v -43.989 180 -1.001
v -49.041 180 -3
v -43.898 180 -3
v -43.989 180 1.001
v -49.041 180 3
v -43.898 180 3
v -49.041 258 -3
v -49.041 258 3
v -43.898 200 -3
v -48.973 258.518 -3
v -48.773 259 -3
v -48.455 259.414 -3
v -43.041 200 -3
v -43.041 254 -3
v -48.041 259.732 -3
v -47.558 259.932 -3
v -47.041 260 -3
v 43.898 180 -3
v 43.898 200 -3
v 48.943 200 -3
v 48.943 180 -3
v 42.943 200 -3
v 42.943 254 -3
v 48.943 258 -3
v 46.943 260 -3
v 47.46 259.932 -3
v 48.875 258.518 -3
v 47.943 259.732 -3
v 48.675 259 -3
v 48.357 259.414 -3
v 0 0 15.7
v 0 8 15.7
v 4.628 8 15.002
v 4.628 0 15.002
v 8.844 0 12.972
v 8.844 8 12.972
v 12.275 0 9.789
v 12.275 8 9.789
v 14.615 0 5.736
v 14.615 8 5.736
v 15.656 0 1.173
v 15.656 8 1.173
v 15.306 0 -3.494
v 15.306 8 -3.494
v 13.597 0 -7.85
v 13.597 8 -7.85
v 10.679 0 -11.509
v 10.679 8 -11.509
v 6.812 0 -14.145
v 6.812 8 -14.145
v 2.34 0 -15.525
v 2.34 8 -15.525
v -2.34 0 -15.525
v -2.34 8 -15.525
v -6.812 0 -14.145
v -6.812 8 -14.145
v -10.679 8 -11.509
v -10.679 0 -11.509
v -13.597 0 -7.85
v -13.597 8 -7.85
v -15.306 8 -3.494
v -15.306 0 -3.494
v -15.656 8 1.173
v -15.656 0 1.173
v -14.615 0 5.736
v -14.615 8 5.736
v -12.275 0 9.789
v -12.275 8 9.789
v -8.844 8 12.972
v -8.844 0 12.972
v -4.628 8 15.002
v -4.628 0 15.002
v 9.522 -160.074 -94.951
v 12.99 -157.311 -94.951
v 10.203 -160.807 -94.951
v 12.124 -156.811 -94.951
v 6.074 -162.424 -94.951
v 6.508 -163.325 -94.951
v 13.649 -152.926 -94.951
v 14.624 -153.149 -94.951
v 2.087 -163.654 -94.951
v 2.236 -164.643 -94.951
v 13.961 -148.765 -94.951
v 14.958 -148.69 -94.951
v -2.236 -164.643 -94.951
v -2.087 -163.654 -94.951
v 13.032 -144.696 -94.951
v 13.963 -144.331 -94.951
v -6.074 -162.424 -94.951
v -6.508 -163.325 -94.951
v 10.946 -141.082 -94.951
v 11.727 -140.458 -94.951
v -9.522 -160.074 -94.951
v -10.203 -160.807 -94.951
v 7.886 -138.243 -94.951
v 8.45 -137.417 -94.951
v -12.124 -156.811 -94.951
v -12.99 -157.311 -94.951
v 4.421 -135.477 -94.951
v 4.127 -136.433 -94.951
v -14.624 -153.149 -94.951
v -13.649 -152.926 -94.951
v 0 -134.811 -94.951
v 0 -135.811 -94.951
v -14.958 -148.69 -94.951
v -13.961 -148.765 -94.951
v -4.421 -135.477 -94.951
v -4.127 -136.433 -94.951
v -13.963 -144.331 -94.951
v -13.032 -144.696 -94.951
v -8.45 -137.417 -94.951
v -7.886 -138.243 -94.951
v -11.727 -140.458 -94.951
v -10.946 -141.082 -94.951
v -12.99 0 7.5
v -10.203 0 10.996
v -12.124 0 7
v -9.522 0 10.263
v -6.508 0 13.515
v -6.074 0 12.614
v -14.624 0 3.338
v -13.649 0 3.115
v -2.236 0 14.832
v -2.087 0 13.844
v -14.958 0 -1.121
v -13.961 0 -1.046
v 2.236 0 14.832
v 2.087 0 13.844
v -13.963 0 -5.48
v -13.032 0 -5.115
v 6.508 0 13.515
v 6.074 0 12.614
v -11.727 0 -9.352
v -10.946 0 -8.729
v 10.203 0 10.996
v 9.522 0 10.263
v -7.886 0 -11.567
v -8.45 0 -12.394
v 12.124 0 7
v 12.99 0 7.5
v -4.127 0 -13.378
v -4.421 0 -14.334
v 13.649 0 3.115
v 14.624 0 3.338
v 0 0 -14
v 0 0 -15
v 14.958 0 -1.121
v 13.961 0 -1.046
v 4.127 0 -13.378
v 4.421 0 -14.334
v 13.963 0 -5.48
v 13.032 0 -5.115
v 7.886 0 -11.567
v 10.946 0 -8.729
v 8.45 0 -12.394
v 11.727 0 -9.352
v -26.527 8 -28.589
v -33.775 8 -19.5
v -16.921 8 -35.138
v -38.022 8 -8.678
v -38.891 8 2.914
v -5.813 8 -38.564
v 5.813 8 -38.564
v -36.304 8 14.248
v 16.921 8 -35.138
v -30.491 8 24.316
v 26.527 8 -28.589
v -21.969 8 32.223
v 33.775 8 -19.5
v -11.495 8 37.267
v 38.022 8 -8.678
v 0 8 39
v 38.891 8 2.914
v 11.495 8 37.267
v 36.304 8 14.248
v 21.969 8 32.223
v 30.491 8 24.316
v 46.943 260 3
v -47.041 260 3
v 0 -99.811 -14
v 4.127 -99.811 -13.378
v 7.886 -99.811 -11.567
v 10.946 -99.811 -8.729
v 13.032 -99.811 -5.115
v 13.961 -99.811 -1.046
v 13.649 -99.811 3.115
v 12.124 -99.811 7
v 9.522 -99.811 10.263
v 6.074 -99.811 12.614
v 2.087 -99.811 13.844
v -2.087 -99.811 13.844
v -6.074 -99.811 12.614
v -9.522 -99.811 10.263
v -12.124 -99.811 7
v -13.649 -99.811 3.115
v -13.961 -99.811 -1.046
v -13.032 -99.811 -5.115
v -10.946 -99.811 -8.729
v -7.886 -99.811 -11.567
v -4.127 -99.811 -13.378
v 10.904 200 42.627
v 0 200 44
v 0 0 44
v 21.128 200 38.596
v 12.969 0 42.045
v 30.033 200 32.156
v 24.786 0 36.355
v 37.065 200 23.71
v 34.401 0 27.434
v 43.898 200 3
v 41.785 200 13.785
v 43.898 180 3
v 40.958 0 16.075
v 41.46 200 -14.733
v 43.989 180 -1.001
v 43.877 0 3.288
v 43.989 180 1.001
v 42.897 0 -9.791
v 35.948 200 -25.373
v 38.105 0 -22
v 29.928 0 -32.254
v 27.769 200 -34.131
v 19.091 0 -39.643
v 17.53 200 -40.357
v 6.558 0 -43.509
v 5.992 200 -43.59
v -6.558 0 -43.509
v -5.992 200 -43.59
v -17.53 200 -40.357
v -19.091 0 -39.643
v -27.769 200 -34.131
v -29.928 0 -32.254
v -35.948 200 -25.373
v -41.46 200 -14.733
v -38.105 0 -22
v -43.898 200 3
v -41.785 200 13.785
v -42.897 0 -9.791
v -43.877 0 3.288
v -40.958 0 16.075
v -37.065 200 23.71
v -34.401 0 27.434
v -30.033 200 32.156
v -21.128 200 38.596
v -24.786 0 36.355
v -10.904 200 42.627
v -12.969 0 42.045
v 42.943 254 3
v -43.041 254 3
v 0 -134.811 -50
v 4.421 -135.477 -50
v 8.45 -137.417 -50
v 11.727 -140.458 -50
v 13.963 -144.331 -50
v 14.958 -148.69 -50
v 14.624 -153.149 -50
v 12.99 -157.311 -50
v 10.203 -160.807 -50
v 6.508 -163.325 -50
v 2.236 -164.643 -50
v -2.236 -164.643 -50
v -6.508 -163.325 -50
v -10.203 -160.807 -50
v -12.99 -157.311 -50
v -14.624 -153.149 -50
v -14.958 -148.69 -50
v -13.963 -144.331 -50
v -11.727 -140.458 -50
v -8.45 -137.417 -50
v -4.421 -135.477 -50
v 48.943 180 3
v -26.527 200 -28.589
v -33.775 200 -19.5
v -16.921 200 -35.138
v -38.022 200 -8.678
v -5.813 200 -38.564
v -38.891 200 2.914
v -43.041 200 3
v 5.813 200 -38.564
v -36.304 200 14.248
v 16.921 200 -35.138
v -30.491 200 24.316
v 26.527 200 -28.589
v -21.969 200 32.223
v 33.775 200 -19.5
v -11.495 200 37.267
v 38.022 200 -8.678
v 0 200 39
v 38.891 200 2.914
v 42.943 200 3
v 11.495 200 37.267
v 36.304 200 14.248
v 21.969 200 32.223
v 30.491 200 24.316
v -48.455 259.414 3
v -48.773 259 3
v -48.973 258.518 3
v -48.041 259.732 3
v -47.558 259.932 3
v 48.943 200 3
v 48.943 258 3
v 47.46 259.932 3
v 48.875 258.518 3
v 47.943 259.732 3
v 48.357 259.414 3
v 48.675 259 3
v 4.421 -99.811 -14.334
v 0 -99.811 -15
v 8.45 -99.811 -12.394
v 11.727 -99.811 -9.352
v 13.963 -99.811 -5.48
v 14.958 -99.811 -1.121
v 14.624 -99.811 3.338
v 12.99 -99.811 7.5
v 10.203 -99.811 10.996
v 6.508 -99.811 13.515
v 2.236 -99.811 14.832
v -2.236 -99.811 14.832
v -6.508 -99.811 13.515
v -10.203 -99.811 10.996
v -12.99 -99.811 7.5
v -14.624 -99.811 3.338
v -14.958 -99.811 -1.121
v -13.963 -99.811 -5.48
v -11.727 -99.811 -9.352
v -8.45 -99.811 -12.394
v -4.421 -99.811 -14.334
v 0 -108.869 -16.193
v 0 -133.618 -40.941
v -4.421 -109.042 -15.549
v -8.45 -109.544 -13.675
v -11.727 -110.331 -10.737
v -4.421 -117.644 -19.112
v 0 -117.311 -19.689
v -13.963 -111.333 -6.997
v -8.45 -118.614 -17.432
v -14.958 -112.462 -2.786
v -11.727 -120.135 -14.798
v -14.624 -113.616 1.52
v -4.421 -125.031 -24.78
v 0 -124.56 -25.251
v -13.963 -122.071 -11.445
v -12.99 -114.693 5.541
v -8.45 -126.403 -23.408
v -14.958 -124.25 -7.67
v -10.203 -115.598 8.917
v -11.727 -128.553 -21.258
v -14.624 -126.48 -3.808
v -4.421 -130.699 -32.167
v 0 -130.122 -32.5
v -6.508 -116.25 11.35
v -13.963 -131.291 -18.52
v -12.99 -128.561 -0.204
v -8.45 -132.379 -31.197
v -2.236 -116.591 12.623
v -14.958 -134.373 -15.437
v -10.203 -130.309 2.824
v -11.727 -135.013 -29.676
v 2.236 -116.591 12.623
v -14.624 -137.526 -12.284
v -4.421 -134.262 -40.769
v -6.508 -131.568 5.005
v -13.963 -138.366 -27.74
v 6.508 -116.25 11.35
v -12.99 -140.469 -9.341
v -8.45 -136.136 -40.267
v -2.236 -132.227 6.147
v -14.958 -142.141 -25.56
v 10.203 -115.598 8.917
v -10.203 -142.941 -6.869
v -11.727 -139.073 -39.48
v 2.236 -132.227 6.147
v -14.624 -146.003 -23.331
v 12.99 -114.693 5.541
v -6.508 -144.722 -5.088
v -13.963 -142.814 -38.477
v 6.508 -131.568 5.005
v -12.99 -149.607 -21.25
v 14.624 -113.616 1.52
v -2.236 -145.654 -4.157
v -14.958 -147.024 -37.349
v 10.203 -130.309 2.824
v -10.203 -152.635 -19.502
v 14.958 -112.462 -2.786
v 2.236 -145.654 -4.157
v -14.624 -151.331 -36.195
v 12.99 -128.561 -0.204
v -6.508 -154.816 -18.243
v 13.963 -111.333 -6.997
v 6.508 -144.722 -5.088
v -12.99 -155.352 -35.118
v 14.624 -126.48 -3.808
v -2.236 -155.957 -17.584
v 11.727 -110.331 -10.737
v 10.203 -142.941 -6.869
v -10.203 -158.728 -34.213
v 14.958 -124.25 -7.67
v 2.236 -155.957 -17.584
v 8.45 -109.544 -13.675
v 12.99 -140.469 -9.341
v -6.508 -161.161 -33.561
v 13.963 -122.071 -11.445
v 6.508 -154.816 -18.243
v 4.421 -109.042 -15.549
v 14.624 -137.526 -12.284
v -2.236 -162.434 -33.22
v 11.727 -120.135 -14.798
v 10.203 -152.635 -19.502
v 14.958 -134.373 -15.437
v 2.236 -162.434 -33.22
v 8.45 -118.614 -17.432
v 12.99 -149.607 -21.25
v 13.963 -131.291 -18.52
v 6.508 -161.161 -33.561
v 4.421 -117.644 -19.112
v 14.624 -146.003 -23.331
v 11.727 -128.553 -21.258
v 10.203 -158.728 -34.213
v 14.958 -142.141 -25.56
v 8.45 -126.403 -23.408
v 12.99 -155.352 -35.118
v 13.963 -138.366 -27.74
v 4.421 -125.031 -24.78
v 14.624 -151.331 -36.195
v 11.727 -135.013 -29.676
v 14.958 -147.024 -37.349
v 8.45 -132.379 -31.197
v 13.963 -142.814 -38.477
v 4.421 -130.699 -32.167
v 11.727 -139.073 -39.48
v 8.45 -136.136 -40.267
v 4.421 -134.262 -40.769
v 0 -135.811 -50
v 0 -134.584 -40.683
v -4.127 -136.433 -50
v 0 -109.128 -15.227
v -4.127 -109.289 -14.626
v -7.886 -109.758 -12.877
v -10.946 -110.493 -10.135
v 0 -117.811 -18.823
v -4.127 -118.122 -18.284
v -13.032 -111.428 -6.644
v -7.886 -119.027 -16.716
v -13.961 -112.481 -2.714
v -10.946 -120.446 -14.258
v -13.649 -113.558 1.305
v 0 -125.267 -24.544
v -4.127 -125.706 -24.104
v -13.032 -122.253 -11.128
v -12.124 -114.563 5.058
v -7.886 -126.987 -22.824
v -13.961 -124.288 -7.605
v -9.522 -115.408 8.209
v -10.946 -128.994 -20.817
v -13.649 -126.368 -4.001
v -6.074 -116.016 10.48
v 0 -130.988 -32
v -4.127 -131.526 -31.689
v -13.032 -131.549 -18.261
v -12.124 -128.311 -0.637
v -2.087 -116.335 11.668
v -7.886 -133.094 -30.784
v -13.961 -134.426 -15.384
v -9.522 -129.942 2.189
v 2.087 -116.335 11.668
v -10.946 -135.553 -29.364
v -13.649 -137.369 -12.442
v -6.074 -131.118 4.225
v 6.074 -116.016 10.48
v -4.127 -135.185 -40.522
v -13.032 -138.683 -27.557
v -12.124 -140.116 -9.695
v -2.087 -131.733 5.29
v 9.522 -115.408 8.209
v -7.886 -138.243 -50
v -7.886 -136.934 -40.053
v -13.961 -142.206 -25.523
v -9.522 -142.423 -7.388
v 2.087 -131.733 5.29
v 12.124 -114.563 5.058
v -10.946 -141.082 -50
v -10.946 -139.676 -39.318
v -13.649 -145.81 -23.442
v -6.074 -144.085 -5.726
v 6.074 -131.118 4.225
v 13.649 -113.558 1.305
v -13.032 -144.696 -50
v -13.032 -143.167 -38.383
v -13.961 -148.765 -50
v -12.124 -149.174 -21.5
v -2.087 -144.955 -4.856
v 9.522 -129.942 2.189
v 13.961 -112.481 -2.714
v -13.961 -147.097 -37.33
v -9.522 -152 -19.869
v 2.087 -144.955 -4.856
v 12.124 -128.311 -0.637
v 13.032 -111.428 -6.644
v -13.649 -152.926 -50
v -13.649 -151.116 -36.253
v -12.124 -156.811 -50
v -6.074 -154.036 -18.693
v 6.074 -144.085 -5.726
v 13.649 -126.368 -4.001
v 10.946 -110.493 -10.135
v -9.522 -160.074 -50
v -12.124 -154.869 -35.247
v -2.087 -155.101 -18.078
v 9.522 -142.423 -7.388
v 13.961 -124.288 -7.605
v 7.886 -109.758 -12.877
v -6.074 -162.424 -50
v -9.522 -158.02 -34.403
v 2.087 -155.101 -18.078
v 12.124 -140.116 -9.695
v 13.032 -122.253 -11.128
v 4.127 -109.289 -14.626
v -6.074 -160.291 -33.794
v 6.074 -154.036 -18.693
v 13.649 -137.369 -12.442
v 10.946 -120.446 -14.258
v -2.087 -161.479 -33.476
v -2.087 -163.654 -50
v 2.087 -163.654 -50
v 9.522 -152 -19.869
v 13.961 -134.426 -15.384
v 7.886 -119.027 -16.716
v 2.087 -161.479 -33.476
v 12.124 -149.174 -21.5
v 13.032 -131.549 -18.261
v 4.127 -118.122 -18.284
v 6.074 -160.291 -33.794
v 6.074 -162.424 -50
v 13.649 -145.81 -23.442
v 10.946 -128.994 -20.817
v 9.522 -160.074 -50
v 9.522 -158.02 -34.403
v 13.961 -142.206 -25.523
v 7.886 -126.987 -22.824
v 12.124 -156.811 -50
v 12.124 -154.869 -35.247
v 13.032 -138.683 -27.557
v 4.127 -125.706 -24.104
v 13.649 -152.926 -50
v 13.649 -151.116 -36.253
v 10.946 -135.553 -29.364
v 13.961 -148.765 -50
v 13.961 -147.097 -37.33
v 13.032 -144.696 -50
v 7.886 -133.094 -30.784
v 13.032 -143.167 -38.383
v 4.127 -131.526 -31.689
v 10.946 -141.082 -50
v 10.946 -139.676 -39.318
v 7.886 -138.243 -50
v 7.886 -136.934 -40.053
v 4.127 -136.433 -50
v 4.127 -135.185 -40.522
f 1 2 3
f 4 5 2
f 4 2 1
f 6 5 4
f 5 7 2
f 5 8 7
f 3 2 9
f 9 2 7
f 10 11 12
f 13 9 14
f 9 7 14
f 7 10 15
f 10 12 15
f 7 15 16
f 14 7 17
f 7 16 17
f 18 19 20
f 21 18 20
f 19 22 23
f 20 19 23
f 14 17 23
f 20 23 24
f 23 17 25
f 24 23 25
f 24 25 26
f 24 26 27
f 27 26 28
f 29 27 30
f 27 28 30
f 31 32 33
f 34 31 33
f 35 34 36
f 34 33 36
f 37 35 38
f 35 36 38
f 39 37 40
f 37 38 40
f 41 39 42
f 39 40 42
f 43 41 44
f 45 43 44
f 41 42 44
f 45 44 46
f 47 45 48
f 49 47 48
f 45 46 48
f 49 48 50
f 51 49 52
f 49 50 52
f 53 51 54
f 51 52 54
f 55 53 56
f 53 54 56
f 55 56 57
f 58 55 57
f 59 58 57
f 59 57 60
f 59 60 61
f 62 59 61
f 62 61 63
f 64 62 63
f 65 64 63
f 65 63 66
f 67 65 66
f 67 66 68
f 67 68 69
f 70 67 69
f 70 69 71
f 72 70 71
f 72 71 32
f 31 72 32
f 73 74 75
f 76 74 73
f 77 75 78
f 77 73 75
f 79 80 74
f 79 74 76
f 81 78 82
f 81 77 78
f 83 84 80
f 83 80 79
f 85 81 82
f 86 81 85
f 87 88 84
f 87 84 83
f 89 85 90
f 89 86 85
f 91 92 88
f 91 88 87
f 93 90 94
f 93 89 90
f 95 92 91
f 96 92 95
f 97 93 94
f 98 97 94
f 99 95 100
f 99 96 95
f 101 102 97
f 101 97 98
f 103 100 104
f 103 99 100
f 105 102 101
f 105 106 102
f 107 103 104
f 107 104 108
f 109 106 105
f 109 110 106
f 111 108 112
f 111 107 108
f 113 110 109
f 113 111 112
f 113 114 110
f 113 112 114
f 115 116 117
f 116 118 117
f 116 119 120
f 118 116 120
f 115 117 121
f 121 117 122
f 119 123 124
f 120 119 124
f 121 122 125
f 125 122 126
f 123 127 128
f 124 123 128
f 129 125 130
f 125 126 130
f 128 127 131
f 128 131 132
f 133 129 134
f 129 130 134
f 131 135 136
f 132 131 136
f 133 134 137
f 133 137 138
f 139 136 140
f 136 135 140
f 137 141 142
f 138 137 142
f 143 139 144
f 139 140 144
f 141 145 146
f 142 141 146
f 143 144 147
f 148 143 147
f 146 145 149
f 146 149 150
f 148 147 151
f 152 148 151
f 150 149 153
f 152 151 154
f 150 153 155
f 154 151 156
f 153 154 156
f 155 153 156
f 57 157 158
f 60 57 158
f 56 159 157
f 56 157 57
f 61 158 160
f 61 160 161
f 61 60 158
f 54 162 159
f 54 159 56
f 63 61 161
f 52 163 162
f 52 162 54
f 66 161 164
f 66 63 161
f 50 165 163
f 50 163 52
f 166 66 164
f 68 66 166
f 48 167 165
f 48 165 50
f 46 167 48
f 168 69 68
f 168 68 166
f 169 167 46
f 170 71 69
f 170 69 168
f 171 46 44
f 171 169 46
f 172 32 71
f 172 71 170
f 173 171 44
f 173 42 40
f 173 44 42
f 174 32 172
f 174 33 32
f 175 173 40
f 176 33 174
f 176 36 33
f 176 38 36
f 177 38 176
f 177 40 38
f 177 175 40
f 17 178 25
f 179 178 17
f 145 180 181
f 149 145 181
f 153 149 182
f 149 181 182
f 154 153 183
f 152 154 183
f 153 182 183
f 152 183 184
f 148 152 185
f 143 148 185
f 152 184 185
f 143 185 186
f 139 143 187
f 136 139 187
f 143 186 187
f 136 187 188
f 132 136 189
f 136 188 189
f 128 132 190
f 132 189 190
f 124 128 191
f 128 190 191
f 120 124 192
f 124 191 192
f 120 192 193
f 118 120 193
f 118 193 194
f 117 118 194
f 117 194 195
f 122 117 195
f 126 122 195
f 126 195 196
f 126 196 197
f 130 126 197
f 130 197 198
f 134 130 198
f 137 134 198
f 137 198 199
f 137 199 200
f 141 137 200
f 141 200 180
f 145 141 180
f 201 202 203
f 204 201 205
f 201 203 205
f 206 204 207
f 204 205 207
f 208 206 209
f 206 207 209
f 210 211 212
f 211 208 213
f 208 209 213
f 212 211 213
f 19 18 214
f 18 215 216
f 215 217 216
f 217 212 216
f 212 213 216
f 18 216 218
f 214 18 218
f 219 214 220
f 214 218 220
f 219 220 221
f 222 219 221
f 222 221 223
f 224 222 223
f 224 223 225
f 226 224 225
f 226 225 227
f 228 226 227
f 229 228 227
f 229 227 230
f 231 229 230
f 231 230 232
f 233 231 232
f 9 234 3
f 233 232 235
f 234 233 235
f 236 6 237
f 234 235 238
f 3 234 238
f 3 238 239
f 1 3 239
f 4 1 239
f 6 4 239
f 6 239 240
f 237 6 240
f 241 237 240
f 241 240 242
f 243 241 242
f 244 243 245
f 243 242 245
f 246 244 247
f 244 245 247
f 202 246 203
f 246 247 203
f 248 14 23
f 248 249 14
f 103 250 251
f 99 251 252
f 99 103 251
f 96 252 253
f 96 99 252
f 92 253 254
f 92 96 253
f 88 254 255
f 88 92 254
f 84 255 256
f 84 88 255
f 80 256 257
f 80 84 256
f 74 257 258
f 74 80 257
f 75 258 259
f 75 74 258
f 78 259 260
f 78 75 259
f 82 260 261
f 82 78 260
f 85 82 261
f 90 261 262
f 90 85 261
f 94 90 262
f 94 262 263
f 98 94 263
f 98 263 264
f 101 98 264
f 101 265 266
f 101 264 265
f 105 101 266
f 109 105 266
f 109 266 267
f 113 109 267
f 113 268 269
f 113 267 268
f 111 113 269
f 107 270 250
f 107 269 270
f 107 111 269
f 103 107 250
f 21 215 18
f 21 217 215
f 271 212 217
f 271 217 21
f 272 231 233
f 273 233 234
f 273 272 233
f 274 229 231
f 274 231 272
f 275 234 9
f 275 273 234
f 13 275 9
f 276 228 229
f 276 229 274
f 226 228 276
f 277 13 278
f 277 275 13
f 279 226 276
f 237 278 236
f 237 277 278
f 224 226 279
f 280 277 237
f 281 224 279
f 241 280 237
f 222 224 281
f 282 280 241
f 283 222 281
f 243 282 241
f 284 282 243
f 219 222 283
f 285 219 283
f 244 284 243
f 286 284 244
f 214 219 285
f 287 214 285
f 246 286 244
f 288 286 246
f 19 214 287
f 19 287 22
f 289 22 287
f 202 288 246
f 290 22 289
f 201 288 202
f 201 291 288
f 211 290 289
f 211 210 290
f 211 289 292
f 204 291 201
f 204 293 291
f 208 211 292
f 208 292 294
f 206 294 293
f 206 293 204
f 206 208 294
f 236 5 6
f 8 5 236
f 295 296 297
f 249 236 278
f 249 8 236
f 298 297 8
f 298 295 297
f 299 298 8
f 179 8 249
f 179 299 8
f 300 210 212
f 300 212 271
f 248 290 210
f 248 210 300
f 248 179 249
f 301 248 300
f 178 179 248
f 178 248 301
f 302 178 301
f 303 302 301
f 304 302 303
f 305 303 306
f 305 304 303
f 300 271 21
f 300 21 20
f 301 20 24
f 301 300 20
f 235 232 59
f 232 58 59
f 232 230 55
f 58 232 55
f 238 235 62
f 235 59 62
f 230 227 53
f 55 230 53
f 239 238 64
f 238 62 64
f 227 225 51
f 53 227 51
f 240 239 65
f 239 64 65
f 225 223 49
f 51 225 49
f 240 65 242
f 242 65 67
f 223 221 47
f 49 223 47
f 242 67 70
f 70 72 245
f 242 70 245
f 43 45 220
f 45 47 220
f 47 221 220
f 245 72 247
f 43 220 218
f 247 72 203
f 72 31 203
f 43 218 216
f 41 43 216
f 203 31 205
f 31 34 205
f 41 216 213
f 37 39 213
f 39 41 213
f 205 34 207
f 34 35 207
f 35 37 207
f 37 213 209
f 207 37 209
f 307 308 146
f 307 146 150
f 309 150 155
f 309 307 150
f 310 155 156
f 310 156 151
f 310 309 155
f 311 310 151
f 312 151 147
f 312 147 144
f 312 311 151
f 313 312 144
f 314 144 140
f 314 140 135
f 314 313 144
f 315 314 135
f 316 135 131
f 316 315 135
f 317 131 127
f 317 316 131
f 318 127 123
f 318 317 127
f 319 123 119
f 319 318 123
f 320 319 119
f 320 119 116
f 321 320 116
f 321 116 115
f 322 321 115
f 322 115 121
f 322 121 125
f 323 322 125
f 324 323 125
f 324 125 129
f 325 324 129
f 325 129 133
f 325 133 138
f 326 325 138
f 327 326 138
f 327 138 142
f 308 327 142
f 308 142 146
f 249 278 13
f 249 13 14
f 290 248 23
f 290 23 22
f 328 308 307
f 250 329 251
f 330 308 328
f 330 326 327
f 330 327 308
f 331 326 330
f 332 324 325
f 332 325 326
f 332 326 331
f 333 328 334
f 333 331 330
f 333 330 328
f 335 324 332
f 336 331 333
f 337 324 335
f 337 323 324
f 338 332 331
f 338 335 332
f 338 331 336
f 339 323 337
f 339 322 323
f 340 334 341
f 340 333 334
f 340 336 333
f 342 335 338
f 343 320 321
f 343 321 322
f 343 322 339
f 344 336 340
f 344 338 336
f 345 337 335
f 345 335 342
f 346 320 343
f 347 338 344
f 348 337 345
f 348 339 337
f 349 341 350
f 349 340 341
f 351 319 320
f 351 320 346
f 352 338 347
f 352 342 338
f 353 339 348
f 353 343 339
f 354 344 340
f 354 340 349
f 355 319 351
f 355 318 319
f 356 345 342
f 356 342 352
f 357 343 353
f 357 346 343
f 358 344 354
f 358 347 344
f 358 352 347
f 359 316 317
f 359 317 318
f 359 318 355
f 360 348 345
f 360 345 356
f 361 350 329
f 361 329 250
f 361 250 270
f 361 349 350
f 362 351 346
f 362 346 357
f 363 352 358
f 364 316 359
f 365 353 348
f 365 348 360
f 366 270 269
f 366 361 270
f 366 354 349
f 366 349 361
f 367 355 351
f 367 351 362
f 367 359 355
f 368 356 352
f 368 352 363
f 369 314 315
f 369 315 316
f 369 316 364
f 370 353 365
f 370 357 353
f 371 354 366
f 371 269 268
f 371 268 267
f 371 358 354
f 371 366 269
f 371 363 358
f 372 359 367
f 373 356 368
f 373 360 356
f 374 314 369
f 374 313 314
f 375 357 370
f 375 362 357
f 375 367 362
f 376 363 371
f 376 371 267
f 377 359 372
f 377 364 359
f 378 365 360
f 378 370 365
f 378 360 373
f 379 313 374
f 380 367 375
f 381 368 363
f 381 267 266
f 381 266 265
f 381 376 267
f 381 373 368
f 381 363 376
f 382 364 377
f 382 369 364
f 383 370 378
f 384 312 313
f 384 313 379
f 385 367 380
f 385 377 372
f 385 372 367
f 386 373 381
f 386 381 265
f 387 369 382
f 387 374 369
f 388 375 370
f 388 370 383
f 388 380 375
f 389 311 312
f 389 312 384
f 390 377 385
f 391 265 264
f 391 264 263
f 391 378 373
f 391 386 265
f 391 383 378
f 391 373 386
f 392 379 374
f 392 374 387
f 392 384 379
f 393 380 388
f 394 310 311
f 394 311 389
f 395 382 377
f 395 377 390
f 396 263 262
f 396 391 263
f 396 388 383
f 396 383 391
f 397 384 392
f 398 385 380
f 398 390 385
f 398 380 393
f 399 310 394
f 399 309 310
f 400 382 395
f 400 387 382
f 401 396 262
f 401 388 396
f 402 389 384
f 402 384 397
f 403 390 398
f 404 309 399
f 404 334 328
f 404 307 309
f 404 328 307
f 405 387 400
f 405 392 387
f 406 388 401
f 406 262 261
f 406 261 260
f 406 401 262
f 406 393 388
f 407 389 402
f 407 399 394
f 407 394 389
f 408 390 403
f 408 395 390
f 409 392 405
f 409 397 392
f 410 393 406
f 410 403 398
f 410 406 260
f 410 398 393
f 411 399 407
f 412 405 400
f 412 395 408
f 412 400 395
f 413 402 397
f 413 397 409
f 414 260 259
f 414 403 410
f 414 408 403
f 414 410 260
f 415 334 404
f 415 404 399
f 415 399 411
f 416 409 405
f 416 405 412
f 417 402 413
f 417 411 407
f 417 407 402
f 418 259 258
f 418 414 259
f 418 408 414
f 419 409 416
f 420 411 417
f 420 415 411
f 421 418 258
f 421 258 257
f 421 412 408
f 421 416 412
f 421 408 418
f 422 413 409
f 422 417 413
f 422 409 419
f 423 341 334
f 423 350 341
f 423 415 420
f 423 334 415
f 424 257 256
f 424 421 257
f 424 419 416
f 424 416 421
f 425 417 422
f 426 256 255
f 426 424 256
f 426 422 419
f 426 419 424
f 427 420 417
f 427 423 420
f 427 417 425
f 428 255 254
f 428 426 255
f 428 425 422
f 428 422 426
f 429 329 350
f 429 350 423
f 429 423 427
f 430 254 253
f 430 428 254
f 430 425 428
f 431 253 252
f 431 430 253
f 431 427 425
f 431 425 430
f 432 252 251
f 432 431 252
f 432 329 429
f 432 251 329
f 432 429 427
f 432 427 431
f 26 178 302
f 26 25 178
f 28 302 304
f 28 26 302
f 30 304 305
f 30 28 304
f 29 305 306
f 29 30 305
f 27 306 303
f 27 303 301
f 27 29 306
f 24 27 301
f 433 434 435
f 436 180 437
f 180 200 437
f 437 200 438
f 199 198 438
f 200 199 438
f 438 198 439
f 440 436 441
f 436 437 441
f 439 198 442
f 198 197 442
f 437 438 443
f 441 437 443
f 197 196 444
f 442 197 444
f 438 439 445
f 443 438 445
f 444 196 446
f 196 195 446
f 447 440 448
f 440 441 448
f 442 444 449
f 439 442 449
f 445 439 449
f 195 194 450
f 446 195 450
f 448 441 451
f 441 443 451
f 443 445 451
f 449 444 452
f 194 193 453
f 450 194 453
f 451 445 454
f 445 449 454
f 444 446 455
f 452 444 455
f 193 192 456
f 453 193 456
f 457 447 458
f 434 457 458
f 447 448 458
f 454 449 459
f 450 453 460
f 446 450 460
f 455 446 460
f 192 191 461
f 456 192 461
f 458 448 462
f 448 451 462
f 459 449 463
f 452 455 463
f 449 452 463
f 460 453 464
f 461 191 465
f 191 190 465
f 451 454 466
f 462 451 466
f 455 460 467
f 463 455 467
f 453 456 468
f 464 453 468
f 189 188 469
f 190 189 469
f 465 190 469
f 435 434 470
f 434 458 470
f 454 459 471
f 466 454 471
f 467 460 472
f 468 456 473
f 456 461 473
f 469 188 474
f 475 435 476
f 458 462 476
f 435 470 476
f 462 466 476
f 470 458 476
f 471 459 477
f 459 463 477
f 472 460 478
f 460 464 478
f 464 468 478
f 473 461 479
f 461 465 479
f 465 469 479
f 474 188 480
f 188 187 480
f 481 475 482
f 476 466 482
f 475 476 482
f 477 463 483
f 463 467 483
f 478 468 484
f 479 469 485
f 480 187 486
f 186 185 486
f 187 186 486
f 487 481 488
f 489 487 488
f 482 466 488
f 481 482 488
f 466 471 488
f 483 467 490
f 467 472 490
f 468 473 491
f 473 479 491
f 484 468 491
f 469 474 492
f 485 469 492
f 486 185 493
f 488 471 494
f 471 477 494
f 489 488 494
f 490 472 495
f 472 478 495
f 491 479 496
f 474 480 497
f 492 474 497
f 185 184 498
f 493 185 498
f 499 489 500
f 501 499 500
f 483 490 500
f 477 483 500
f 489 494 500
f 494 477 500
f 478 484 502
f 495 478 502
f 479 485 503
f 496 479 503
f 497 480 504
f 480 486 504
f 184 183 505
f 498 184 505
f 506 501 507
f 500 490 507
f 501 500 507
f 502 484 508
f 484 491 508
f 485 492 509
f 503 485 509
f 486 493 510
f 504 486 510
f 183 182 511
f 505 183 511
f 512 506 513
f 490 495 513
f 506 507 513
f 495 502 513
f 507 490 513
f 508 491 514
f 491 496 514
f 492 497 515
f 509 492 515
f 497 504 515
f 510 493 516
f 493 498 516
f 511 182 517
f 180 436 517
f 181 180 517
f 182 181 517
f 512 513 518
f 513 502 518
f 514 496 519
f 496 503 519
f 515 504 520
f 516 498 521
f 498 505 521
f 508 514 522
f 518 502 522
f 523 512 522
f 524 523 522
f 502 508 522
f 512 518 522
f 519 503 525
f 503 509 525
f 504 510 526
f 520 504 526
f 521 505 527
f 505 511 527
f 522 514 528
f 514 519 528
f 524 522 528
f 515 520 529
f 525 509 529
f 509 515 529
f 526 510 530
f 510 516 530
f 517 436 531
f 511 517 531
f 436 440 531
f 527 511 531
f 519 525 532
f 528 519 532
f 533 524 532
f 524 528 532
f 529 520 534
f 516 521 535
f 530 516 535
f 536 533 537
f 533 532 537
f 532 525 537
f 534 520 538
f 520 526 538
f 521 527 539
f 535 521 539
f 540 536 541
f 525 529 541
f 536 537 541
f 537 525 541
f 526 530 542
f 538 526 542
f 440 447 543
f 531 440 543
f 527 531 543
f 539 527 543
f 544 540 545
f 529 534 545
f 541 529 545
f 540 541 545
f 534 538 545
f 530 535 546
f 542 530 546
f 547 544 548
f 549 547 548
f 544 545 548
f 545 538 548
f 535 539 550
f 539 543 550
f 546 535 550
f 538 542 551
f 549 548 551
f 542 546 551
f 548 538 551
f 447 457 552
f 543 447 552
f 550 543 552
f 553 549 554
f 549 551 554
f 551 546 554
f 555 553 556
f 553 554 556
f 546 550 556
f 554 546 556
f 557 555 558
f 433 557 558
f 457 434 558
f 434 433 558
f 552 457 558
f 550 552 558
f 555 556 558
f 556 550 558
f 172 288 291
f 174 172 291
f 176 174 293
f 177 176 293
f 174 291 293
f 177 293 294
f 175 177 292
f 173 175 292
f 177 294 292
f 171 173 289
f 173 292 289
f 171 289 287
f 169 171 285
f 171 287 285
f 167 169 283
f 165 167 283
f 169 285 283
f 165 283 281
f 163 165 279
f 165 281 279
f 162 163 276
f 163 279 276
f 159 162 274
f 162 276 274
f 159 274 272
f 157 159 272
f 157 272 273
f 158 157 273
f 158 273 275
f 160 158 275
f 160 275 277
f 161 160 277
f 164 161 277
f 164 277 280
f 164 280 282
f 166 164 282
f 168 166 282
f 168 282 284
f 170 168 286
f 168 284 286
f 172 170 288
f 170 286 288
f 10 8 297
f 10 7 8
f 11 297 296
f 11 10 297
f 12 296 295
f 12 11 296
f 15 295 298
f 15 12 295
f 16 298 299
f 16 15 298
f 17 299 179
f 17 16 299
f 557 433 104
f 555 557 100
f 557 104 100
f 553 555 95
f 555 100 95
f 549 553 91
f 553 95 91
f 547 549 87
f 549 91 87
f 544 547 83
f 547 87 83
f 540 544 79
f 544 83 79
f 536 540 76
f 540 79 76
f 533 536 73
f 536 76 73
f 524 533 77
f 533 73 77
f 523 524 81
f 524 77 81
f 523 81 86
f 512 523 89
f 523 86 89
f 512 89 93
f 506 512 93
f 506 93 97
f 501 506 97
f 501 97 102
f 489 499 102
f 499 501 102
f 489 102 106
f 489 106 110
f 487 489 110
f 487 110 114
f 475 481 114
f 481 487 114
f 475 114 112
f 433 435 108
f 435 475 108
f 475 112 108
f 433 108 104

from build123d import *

# Parameters (mm, degrees)
ESBO_O1_R                     = 44
RESSALTO_EXTRUS_O1_DEPTH      = 200
ESBO_O2_R                     = 39
CORTE_EXTRUS_O1_DEPTH         = 192
CORTE_EXTRUS_O2_REACH         = 203.832
ESBO_O3_R                     = 15.7
RESSALTO_EXTRUS_O2_DEPTH      = 3
RESSALTO_EXTRUS_O2_DEPTH_BACK = 3
FILETE1_R                     = 2
SWEEP_THIN1_PROFILE_R         = 15
SWEEP_THIN1_PROFILE_R_2       = 14


with BuildPart() as part:
    # Esboço1 → Ressalto-extrusão1 (new body)
    with BuildSketch(Plane(origin=(0, 0, 0), x_dir=(1, 0, 0), z_dir=(0, 1, 0))):
        Circle(ESBO_O1_R)
    extrude(amount=RESSALTO_EXTRUS_O1_DEPTH)

    # Esboço2 → Corte-extrusão1 (cut)
    with BuildSketch(Plane(origin=(0, 200, 0), x_dir=(1, 0, 0), z_dir=(0, 1, 0))):
        Circle(ESBO_O2_R)
    extrude(amount=-CORTE_EXTRUS_O1_DEPTH, mode=Mode.SUBTRACT)

    # Esboço3 → Corte-extrusão2 (cut, up to next)
    with BuildSketch(Plane(origin=(0, 8, 0), x_dir=(1, 0, 0), z_dir=(0, 1, 0)), mode=Mode.PRIVATE) as corte_extrus_o2_sk1:
        Circle(ESBO_O3_R)
    corte_extrus_o2_tool1 = extrude(corte_extrus_o2_sk1.sketch, amount=-CORTE_EXTRUS_O2_REACH, mode=Mode.PRIVATE) & part.part
    add(corte_extrus_o2_tool1.solids().sort_by_distance((0, 8, 0))[0], mode=Mode.SUBTRACT)

    # Esboço4 → Ressalto-extrusão2 (add, two sides: drawn at the far end of the back side and taken through both)
    with BuildSketch(Plane.XY.offset(-RESSALTO_EXTRUS_O2_DEPTH_BACK)):
        Polygon((-49.040737885, 260), (-49.040737885, 180), (-43.040737885, 180), (-43.040737885, 254), (42.942783163, 254), (42.942783163, 180), (48.942783163, 180), (48.942783163, 260), align=None)
    extrude(amount=RESSALTO_EXTRUS_O2_DEPTH + RESSALTO_EXTRUS_O2_DEPTH_BACK)

    # Filete1
    filete1_edges = [part.edges().sort_by_distance(p)[0] for p in [
        (-49.040737885, 260, 0),
        (48.942783163, 260, 0),
    ]]
    fillet(filete1_edges, radius=FILETE1_R)


with BuildPart() as body_2:
    # Sweep-Thin1: sweep along a curve in space
    with BuildLine() as sweep_thin1_path:
        Line((0, 0, 0), (0, -99.810784889, 0))
        ThreePointArc((0, -149.810784889, -50), (0, -135.166123949, -14.644660941), (0, -99.810784889, 0))
        Line((0, -149.810784889, -50), (0, -149.810784889, -94.950630416))
    # Sweep-Thin1 profile (on start of the path) → Sweep-Thin1 (sweep)
    with BuildSketch(Plane(origin=(0, 0, 0), x_dir=(0, 0, -1), z_dir=(0, -1, 0))):
        Circle(SWEEP_THIN1_PROFILE_R)
        Circle(SWEEP_THIN1_PROFILE_R_2, mode=Mode.SUBTRACT)
    sweep(path=sweep_thin1_path.line)


solid = Compound([part.part, body_2.part])
